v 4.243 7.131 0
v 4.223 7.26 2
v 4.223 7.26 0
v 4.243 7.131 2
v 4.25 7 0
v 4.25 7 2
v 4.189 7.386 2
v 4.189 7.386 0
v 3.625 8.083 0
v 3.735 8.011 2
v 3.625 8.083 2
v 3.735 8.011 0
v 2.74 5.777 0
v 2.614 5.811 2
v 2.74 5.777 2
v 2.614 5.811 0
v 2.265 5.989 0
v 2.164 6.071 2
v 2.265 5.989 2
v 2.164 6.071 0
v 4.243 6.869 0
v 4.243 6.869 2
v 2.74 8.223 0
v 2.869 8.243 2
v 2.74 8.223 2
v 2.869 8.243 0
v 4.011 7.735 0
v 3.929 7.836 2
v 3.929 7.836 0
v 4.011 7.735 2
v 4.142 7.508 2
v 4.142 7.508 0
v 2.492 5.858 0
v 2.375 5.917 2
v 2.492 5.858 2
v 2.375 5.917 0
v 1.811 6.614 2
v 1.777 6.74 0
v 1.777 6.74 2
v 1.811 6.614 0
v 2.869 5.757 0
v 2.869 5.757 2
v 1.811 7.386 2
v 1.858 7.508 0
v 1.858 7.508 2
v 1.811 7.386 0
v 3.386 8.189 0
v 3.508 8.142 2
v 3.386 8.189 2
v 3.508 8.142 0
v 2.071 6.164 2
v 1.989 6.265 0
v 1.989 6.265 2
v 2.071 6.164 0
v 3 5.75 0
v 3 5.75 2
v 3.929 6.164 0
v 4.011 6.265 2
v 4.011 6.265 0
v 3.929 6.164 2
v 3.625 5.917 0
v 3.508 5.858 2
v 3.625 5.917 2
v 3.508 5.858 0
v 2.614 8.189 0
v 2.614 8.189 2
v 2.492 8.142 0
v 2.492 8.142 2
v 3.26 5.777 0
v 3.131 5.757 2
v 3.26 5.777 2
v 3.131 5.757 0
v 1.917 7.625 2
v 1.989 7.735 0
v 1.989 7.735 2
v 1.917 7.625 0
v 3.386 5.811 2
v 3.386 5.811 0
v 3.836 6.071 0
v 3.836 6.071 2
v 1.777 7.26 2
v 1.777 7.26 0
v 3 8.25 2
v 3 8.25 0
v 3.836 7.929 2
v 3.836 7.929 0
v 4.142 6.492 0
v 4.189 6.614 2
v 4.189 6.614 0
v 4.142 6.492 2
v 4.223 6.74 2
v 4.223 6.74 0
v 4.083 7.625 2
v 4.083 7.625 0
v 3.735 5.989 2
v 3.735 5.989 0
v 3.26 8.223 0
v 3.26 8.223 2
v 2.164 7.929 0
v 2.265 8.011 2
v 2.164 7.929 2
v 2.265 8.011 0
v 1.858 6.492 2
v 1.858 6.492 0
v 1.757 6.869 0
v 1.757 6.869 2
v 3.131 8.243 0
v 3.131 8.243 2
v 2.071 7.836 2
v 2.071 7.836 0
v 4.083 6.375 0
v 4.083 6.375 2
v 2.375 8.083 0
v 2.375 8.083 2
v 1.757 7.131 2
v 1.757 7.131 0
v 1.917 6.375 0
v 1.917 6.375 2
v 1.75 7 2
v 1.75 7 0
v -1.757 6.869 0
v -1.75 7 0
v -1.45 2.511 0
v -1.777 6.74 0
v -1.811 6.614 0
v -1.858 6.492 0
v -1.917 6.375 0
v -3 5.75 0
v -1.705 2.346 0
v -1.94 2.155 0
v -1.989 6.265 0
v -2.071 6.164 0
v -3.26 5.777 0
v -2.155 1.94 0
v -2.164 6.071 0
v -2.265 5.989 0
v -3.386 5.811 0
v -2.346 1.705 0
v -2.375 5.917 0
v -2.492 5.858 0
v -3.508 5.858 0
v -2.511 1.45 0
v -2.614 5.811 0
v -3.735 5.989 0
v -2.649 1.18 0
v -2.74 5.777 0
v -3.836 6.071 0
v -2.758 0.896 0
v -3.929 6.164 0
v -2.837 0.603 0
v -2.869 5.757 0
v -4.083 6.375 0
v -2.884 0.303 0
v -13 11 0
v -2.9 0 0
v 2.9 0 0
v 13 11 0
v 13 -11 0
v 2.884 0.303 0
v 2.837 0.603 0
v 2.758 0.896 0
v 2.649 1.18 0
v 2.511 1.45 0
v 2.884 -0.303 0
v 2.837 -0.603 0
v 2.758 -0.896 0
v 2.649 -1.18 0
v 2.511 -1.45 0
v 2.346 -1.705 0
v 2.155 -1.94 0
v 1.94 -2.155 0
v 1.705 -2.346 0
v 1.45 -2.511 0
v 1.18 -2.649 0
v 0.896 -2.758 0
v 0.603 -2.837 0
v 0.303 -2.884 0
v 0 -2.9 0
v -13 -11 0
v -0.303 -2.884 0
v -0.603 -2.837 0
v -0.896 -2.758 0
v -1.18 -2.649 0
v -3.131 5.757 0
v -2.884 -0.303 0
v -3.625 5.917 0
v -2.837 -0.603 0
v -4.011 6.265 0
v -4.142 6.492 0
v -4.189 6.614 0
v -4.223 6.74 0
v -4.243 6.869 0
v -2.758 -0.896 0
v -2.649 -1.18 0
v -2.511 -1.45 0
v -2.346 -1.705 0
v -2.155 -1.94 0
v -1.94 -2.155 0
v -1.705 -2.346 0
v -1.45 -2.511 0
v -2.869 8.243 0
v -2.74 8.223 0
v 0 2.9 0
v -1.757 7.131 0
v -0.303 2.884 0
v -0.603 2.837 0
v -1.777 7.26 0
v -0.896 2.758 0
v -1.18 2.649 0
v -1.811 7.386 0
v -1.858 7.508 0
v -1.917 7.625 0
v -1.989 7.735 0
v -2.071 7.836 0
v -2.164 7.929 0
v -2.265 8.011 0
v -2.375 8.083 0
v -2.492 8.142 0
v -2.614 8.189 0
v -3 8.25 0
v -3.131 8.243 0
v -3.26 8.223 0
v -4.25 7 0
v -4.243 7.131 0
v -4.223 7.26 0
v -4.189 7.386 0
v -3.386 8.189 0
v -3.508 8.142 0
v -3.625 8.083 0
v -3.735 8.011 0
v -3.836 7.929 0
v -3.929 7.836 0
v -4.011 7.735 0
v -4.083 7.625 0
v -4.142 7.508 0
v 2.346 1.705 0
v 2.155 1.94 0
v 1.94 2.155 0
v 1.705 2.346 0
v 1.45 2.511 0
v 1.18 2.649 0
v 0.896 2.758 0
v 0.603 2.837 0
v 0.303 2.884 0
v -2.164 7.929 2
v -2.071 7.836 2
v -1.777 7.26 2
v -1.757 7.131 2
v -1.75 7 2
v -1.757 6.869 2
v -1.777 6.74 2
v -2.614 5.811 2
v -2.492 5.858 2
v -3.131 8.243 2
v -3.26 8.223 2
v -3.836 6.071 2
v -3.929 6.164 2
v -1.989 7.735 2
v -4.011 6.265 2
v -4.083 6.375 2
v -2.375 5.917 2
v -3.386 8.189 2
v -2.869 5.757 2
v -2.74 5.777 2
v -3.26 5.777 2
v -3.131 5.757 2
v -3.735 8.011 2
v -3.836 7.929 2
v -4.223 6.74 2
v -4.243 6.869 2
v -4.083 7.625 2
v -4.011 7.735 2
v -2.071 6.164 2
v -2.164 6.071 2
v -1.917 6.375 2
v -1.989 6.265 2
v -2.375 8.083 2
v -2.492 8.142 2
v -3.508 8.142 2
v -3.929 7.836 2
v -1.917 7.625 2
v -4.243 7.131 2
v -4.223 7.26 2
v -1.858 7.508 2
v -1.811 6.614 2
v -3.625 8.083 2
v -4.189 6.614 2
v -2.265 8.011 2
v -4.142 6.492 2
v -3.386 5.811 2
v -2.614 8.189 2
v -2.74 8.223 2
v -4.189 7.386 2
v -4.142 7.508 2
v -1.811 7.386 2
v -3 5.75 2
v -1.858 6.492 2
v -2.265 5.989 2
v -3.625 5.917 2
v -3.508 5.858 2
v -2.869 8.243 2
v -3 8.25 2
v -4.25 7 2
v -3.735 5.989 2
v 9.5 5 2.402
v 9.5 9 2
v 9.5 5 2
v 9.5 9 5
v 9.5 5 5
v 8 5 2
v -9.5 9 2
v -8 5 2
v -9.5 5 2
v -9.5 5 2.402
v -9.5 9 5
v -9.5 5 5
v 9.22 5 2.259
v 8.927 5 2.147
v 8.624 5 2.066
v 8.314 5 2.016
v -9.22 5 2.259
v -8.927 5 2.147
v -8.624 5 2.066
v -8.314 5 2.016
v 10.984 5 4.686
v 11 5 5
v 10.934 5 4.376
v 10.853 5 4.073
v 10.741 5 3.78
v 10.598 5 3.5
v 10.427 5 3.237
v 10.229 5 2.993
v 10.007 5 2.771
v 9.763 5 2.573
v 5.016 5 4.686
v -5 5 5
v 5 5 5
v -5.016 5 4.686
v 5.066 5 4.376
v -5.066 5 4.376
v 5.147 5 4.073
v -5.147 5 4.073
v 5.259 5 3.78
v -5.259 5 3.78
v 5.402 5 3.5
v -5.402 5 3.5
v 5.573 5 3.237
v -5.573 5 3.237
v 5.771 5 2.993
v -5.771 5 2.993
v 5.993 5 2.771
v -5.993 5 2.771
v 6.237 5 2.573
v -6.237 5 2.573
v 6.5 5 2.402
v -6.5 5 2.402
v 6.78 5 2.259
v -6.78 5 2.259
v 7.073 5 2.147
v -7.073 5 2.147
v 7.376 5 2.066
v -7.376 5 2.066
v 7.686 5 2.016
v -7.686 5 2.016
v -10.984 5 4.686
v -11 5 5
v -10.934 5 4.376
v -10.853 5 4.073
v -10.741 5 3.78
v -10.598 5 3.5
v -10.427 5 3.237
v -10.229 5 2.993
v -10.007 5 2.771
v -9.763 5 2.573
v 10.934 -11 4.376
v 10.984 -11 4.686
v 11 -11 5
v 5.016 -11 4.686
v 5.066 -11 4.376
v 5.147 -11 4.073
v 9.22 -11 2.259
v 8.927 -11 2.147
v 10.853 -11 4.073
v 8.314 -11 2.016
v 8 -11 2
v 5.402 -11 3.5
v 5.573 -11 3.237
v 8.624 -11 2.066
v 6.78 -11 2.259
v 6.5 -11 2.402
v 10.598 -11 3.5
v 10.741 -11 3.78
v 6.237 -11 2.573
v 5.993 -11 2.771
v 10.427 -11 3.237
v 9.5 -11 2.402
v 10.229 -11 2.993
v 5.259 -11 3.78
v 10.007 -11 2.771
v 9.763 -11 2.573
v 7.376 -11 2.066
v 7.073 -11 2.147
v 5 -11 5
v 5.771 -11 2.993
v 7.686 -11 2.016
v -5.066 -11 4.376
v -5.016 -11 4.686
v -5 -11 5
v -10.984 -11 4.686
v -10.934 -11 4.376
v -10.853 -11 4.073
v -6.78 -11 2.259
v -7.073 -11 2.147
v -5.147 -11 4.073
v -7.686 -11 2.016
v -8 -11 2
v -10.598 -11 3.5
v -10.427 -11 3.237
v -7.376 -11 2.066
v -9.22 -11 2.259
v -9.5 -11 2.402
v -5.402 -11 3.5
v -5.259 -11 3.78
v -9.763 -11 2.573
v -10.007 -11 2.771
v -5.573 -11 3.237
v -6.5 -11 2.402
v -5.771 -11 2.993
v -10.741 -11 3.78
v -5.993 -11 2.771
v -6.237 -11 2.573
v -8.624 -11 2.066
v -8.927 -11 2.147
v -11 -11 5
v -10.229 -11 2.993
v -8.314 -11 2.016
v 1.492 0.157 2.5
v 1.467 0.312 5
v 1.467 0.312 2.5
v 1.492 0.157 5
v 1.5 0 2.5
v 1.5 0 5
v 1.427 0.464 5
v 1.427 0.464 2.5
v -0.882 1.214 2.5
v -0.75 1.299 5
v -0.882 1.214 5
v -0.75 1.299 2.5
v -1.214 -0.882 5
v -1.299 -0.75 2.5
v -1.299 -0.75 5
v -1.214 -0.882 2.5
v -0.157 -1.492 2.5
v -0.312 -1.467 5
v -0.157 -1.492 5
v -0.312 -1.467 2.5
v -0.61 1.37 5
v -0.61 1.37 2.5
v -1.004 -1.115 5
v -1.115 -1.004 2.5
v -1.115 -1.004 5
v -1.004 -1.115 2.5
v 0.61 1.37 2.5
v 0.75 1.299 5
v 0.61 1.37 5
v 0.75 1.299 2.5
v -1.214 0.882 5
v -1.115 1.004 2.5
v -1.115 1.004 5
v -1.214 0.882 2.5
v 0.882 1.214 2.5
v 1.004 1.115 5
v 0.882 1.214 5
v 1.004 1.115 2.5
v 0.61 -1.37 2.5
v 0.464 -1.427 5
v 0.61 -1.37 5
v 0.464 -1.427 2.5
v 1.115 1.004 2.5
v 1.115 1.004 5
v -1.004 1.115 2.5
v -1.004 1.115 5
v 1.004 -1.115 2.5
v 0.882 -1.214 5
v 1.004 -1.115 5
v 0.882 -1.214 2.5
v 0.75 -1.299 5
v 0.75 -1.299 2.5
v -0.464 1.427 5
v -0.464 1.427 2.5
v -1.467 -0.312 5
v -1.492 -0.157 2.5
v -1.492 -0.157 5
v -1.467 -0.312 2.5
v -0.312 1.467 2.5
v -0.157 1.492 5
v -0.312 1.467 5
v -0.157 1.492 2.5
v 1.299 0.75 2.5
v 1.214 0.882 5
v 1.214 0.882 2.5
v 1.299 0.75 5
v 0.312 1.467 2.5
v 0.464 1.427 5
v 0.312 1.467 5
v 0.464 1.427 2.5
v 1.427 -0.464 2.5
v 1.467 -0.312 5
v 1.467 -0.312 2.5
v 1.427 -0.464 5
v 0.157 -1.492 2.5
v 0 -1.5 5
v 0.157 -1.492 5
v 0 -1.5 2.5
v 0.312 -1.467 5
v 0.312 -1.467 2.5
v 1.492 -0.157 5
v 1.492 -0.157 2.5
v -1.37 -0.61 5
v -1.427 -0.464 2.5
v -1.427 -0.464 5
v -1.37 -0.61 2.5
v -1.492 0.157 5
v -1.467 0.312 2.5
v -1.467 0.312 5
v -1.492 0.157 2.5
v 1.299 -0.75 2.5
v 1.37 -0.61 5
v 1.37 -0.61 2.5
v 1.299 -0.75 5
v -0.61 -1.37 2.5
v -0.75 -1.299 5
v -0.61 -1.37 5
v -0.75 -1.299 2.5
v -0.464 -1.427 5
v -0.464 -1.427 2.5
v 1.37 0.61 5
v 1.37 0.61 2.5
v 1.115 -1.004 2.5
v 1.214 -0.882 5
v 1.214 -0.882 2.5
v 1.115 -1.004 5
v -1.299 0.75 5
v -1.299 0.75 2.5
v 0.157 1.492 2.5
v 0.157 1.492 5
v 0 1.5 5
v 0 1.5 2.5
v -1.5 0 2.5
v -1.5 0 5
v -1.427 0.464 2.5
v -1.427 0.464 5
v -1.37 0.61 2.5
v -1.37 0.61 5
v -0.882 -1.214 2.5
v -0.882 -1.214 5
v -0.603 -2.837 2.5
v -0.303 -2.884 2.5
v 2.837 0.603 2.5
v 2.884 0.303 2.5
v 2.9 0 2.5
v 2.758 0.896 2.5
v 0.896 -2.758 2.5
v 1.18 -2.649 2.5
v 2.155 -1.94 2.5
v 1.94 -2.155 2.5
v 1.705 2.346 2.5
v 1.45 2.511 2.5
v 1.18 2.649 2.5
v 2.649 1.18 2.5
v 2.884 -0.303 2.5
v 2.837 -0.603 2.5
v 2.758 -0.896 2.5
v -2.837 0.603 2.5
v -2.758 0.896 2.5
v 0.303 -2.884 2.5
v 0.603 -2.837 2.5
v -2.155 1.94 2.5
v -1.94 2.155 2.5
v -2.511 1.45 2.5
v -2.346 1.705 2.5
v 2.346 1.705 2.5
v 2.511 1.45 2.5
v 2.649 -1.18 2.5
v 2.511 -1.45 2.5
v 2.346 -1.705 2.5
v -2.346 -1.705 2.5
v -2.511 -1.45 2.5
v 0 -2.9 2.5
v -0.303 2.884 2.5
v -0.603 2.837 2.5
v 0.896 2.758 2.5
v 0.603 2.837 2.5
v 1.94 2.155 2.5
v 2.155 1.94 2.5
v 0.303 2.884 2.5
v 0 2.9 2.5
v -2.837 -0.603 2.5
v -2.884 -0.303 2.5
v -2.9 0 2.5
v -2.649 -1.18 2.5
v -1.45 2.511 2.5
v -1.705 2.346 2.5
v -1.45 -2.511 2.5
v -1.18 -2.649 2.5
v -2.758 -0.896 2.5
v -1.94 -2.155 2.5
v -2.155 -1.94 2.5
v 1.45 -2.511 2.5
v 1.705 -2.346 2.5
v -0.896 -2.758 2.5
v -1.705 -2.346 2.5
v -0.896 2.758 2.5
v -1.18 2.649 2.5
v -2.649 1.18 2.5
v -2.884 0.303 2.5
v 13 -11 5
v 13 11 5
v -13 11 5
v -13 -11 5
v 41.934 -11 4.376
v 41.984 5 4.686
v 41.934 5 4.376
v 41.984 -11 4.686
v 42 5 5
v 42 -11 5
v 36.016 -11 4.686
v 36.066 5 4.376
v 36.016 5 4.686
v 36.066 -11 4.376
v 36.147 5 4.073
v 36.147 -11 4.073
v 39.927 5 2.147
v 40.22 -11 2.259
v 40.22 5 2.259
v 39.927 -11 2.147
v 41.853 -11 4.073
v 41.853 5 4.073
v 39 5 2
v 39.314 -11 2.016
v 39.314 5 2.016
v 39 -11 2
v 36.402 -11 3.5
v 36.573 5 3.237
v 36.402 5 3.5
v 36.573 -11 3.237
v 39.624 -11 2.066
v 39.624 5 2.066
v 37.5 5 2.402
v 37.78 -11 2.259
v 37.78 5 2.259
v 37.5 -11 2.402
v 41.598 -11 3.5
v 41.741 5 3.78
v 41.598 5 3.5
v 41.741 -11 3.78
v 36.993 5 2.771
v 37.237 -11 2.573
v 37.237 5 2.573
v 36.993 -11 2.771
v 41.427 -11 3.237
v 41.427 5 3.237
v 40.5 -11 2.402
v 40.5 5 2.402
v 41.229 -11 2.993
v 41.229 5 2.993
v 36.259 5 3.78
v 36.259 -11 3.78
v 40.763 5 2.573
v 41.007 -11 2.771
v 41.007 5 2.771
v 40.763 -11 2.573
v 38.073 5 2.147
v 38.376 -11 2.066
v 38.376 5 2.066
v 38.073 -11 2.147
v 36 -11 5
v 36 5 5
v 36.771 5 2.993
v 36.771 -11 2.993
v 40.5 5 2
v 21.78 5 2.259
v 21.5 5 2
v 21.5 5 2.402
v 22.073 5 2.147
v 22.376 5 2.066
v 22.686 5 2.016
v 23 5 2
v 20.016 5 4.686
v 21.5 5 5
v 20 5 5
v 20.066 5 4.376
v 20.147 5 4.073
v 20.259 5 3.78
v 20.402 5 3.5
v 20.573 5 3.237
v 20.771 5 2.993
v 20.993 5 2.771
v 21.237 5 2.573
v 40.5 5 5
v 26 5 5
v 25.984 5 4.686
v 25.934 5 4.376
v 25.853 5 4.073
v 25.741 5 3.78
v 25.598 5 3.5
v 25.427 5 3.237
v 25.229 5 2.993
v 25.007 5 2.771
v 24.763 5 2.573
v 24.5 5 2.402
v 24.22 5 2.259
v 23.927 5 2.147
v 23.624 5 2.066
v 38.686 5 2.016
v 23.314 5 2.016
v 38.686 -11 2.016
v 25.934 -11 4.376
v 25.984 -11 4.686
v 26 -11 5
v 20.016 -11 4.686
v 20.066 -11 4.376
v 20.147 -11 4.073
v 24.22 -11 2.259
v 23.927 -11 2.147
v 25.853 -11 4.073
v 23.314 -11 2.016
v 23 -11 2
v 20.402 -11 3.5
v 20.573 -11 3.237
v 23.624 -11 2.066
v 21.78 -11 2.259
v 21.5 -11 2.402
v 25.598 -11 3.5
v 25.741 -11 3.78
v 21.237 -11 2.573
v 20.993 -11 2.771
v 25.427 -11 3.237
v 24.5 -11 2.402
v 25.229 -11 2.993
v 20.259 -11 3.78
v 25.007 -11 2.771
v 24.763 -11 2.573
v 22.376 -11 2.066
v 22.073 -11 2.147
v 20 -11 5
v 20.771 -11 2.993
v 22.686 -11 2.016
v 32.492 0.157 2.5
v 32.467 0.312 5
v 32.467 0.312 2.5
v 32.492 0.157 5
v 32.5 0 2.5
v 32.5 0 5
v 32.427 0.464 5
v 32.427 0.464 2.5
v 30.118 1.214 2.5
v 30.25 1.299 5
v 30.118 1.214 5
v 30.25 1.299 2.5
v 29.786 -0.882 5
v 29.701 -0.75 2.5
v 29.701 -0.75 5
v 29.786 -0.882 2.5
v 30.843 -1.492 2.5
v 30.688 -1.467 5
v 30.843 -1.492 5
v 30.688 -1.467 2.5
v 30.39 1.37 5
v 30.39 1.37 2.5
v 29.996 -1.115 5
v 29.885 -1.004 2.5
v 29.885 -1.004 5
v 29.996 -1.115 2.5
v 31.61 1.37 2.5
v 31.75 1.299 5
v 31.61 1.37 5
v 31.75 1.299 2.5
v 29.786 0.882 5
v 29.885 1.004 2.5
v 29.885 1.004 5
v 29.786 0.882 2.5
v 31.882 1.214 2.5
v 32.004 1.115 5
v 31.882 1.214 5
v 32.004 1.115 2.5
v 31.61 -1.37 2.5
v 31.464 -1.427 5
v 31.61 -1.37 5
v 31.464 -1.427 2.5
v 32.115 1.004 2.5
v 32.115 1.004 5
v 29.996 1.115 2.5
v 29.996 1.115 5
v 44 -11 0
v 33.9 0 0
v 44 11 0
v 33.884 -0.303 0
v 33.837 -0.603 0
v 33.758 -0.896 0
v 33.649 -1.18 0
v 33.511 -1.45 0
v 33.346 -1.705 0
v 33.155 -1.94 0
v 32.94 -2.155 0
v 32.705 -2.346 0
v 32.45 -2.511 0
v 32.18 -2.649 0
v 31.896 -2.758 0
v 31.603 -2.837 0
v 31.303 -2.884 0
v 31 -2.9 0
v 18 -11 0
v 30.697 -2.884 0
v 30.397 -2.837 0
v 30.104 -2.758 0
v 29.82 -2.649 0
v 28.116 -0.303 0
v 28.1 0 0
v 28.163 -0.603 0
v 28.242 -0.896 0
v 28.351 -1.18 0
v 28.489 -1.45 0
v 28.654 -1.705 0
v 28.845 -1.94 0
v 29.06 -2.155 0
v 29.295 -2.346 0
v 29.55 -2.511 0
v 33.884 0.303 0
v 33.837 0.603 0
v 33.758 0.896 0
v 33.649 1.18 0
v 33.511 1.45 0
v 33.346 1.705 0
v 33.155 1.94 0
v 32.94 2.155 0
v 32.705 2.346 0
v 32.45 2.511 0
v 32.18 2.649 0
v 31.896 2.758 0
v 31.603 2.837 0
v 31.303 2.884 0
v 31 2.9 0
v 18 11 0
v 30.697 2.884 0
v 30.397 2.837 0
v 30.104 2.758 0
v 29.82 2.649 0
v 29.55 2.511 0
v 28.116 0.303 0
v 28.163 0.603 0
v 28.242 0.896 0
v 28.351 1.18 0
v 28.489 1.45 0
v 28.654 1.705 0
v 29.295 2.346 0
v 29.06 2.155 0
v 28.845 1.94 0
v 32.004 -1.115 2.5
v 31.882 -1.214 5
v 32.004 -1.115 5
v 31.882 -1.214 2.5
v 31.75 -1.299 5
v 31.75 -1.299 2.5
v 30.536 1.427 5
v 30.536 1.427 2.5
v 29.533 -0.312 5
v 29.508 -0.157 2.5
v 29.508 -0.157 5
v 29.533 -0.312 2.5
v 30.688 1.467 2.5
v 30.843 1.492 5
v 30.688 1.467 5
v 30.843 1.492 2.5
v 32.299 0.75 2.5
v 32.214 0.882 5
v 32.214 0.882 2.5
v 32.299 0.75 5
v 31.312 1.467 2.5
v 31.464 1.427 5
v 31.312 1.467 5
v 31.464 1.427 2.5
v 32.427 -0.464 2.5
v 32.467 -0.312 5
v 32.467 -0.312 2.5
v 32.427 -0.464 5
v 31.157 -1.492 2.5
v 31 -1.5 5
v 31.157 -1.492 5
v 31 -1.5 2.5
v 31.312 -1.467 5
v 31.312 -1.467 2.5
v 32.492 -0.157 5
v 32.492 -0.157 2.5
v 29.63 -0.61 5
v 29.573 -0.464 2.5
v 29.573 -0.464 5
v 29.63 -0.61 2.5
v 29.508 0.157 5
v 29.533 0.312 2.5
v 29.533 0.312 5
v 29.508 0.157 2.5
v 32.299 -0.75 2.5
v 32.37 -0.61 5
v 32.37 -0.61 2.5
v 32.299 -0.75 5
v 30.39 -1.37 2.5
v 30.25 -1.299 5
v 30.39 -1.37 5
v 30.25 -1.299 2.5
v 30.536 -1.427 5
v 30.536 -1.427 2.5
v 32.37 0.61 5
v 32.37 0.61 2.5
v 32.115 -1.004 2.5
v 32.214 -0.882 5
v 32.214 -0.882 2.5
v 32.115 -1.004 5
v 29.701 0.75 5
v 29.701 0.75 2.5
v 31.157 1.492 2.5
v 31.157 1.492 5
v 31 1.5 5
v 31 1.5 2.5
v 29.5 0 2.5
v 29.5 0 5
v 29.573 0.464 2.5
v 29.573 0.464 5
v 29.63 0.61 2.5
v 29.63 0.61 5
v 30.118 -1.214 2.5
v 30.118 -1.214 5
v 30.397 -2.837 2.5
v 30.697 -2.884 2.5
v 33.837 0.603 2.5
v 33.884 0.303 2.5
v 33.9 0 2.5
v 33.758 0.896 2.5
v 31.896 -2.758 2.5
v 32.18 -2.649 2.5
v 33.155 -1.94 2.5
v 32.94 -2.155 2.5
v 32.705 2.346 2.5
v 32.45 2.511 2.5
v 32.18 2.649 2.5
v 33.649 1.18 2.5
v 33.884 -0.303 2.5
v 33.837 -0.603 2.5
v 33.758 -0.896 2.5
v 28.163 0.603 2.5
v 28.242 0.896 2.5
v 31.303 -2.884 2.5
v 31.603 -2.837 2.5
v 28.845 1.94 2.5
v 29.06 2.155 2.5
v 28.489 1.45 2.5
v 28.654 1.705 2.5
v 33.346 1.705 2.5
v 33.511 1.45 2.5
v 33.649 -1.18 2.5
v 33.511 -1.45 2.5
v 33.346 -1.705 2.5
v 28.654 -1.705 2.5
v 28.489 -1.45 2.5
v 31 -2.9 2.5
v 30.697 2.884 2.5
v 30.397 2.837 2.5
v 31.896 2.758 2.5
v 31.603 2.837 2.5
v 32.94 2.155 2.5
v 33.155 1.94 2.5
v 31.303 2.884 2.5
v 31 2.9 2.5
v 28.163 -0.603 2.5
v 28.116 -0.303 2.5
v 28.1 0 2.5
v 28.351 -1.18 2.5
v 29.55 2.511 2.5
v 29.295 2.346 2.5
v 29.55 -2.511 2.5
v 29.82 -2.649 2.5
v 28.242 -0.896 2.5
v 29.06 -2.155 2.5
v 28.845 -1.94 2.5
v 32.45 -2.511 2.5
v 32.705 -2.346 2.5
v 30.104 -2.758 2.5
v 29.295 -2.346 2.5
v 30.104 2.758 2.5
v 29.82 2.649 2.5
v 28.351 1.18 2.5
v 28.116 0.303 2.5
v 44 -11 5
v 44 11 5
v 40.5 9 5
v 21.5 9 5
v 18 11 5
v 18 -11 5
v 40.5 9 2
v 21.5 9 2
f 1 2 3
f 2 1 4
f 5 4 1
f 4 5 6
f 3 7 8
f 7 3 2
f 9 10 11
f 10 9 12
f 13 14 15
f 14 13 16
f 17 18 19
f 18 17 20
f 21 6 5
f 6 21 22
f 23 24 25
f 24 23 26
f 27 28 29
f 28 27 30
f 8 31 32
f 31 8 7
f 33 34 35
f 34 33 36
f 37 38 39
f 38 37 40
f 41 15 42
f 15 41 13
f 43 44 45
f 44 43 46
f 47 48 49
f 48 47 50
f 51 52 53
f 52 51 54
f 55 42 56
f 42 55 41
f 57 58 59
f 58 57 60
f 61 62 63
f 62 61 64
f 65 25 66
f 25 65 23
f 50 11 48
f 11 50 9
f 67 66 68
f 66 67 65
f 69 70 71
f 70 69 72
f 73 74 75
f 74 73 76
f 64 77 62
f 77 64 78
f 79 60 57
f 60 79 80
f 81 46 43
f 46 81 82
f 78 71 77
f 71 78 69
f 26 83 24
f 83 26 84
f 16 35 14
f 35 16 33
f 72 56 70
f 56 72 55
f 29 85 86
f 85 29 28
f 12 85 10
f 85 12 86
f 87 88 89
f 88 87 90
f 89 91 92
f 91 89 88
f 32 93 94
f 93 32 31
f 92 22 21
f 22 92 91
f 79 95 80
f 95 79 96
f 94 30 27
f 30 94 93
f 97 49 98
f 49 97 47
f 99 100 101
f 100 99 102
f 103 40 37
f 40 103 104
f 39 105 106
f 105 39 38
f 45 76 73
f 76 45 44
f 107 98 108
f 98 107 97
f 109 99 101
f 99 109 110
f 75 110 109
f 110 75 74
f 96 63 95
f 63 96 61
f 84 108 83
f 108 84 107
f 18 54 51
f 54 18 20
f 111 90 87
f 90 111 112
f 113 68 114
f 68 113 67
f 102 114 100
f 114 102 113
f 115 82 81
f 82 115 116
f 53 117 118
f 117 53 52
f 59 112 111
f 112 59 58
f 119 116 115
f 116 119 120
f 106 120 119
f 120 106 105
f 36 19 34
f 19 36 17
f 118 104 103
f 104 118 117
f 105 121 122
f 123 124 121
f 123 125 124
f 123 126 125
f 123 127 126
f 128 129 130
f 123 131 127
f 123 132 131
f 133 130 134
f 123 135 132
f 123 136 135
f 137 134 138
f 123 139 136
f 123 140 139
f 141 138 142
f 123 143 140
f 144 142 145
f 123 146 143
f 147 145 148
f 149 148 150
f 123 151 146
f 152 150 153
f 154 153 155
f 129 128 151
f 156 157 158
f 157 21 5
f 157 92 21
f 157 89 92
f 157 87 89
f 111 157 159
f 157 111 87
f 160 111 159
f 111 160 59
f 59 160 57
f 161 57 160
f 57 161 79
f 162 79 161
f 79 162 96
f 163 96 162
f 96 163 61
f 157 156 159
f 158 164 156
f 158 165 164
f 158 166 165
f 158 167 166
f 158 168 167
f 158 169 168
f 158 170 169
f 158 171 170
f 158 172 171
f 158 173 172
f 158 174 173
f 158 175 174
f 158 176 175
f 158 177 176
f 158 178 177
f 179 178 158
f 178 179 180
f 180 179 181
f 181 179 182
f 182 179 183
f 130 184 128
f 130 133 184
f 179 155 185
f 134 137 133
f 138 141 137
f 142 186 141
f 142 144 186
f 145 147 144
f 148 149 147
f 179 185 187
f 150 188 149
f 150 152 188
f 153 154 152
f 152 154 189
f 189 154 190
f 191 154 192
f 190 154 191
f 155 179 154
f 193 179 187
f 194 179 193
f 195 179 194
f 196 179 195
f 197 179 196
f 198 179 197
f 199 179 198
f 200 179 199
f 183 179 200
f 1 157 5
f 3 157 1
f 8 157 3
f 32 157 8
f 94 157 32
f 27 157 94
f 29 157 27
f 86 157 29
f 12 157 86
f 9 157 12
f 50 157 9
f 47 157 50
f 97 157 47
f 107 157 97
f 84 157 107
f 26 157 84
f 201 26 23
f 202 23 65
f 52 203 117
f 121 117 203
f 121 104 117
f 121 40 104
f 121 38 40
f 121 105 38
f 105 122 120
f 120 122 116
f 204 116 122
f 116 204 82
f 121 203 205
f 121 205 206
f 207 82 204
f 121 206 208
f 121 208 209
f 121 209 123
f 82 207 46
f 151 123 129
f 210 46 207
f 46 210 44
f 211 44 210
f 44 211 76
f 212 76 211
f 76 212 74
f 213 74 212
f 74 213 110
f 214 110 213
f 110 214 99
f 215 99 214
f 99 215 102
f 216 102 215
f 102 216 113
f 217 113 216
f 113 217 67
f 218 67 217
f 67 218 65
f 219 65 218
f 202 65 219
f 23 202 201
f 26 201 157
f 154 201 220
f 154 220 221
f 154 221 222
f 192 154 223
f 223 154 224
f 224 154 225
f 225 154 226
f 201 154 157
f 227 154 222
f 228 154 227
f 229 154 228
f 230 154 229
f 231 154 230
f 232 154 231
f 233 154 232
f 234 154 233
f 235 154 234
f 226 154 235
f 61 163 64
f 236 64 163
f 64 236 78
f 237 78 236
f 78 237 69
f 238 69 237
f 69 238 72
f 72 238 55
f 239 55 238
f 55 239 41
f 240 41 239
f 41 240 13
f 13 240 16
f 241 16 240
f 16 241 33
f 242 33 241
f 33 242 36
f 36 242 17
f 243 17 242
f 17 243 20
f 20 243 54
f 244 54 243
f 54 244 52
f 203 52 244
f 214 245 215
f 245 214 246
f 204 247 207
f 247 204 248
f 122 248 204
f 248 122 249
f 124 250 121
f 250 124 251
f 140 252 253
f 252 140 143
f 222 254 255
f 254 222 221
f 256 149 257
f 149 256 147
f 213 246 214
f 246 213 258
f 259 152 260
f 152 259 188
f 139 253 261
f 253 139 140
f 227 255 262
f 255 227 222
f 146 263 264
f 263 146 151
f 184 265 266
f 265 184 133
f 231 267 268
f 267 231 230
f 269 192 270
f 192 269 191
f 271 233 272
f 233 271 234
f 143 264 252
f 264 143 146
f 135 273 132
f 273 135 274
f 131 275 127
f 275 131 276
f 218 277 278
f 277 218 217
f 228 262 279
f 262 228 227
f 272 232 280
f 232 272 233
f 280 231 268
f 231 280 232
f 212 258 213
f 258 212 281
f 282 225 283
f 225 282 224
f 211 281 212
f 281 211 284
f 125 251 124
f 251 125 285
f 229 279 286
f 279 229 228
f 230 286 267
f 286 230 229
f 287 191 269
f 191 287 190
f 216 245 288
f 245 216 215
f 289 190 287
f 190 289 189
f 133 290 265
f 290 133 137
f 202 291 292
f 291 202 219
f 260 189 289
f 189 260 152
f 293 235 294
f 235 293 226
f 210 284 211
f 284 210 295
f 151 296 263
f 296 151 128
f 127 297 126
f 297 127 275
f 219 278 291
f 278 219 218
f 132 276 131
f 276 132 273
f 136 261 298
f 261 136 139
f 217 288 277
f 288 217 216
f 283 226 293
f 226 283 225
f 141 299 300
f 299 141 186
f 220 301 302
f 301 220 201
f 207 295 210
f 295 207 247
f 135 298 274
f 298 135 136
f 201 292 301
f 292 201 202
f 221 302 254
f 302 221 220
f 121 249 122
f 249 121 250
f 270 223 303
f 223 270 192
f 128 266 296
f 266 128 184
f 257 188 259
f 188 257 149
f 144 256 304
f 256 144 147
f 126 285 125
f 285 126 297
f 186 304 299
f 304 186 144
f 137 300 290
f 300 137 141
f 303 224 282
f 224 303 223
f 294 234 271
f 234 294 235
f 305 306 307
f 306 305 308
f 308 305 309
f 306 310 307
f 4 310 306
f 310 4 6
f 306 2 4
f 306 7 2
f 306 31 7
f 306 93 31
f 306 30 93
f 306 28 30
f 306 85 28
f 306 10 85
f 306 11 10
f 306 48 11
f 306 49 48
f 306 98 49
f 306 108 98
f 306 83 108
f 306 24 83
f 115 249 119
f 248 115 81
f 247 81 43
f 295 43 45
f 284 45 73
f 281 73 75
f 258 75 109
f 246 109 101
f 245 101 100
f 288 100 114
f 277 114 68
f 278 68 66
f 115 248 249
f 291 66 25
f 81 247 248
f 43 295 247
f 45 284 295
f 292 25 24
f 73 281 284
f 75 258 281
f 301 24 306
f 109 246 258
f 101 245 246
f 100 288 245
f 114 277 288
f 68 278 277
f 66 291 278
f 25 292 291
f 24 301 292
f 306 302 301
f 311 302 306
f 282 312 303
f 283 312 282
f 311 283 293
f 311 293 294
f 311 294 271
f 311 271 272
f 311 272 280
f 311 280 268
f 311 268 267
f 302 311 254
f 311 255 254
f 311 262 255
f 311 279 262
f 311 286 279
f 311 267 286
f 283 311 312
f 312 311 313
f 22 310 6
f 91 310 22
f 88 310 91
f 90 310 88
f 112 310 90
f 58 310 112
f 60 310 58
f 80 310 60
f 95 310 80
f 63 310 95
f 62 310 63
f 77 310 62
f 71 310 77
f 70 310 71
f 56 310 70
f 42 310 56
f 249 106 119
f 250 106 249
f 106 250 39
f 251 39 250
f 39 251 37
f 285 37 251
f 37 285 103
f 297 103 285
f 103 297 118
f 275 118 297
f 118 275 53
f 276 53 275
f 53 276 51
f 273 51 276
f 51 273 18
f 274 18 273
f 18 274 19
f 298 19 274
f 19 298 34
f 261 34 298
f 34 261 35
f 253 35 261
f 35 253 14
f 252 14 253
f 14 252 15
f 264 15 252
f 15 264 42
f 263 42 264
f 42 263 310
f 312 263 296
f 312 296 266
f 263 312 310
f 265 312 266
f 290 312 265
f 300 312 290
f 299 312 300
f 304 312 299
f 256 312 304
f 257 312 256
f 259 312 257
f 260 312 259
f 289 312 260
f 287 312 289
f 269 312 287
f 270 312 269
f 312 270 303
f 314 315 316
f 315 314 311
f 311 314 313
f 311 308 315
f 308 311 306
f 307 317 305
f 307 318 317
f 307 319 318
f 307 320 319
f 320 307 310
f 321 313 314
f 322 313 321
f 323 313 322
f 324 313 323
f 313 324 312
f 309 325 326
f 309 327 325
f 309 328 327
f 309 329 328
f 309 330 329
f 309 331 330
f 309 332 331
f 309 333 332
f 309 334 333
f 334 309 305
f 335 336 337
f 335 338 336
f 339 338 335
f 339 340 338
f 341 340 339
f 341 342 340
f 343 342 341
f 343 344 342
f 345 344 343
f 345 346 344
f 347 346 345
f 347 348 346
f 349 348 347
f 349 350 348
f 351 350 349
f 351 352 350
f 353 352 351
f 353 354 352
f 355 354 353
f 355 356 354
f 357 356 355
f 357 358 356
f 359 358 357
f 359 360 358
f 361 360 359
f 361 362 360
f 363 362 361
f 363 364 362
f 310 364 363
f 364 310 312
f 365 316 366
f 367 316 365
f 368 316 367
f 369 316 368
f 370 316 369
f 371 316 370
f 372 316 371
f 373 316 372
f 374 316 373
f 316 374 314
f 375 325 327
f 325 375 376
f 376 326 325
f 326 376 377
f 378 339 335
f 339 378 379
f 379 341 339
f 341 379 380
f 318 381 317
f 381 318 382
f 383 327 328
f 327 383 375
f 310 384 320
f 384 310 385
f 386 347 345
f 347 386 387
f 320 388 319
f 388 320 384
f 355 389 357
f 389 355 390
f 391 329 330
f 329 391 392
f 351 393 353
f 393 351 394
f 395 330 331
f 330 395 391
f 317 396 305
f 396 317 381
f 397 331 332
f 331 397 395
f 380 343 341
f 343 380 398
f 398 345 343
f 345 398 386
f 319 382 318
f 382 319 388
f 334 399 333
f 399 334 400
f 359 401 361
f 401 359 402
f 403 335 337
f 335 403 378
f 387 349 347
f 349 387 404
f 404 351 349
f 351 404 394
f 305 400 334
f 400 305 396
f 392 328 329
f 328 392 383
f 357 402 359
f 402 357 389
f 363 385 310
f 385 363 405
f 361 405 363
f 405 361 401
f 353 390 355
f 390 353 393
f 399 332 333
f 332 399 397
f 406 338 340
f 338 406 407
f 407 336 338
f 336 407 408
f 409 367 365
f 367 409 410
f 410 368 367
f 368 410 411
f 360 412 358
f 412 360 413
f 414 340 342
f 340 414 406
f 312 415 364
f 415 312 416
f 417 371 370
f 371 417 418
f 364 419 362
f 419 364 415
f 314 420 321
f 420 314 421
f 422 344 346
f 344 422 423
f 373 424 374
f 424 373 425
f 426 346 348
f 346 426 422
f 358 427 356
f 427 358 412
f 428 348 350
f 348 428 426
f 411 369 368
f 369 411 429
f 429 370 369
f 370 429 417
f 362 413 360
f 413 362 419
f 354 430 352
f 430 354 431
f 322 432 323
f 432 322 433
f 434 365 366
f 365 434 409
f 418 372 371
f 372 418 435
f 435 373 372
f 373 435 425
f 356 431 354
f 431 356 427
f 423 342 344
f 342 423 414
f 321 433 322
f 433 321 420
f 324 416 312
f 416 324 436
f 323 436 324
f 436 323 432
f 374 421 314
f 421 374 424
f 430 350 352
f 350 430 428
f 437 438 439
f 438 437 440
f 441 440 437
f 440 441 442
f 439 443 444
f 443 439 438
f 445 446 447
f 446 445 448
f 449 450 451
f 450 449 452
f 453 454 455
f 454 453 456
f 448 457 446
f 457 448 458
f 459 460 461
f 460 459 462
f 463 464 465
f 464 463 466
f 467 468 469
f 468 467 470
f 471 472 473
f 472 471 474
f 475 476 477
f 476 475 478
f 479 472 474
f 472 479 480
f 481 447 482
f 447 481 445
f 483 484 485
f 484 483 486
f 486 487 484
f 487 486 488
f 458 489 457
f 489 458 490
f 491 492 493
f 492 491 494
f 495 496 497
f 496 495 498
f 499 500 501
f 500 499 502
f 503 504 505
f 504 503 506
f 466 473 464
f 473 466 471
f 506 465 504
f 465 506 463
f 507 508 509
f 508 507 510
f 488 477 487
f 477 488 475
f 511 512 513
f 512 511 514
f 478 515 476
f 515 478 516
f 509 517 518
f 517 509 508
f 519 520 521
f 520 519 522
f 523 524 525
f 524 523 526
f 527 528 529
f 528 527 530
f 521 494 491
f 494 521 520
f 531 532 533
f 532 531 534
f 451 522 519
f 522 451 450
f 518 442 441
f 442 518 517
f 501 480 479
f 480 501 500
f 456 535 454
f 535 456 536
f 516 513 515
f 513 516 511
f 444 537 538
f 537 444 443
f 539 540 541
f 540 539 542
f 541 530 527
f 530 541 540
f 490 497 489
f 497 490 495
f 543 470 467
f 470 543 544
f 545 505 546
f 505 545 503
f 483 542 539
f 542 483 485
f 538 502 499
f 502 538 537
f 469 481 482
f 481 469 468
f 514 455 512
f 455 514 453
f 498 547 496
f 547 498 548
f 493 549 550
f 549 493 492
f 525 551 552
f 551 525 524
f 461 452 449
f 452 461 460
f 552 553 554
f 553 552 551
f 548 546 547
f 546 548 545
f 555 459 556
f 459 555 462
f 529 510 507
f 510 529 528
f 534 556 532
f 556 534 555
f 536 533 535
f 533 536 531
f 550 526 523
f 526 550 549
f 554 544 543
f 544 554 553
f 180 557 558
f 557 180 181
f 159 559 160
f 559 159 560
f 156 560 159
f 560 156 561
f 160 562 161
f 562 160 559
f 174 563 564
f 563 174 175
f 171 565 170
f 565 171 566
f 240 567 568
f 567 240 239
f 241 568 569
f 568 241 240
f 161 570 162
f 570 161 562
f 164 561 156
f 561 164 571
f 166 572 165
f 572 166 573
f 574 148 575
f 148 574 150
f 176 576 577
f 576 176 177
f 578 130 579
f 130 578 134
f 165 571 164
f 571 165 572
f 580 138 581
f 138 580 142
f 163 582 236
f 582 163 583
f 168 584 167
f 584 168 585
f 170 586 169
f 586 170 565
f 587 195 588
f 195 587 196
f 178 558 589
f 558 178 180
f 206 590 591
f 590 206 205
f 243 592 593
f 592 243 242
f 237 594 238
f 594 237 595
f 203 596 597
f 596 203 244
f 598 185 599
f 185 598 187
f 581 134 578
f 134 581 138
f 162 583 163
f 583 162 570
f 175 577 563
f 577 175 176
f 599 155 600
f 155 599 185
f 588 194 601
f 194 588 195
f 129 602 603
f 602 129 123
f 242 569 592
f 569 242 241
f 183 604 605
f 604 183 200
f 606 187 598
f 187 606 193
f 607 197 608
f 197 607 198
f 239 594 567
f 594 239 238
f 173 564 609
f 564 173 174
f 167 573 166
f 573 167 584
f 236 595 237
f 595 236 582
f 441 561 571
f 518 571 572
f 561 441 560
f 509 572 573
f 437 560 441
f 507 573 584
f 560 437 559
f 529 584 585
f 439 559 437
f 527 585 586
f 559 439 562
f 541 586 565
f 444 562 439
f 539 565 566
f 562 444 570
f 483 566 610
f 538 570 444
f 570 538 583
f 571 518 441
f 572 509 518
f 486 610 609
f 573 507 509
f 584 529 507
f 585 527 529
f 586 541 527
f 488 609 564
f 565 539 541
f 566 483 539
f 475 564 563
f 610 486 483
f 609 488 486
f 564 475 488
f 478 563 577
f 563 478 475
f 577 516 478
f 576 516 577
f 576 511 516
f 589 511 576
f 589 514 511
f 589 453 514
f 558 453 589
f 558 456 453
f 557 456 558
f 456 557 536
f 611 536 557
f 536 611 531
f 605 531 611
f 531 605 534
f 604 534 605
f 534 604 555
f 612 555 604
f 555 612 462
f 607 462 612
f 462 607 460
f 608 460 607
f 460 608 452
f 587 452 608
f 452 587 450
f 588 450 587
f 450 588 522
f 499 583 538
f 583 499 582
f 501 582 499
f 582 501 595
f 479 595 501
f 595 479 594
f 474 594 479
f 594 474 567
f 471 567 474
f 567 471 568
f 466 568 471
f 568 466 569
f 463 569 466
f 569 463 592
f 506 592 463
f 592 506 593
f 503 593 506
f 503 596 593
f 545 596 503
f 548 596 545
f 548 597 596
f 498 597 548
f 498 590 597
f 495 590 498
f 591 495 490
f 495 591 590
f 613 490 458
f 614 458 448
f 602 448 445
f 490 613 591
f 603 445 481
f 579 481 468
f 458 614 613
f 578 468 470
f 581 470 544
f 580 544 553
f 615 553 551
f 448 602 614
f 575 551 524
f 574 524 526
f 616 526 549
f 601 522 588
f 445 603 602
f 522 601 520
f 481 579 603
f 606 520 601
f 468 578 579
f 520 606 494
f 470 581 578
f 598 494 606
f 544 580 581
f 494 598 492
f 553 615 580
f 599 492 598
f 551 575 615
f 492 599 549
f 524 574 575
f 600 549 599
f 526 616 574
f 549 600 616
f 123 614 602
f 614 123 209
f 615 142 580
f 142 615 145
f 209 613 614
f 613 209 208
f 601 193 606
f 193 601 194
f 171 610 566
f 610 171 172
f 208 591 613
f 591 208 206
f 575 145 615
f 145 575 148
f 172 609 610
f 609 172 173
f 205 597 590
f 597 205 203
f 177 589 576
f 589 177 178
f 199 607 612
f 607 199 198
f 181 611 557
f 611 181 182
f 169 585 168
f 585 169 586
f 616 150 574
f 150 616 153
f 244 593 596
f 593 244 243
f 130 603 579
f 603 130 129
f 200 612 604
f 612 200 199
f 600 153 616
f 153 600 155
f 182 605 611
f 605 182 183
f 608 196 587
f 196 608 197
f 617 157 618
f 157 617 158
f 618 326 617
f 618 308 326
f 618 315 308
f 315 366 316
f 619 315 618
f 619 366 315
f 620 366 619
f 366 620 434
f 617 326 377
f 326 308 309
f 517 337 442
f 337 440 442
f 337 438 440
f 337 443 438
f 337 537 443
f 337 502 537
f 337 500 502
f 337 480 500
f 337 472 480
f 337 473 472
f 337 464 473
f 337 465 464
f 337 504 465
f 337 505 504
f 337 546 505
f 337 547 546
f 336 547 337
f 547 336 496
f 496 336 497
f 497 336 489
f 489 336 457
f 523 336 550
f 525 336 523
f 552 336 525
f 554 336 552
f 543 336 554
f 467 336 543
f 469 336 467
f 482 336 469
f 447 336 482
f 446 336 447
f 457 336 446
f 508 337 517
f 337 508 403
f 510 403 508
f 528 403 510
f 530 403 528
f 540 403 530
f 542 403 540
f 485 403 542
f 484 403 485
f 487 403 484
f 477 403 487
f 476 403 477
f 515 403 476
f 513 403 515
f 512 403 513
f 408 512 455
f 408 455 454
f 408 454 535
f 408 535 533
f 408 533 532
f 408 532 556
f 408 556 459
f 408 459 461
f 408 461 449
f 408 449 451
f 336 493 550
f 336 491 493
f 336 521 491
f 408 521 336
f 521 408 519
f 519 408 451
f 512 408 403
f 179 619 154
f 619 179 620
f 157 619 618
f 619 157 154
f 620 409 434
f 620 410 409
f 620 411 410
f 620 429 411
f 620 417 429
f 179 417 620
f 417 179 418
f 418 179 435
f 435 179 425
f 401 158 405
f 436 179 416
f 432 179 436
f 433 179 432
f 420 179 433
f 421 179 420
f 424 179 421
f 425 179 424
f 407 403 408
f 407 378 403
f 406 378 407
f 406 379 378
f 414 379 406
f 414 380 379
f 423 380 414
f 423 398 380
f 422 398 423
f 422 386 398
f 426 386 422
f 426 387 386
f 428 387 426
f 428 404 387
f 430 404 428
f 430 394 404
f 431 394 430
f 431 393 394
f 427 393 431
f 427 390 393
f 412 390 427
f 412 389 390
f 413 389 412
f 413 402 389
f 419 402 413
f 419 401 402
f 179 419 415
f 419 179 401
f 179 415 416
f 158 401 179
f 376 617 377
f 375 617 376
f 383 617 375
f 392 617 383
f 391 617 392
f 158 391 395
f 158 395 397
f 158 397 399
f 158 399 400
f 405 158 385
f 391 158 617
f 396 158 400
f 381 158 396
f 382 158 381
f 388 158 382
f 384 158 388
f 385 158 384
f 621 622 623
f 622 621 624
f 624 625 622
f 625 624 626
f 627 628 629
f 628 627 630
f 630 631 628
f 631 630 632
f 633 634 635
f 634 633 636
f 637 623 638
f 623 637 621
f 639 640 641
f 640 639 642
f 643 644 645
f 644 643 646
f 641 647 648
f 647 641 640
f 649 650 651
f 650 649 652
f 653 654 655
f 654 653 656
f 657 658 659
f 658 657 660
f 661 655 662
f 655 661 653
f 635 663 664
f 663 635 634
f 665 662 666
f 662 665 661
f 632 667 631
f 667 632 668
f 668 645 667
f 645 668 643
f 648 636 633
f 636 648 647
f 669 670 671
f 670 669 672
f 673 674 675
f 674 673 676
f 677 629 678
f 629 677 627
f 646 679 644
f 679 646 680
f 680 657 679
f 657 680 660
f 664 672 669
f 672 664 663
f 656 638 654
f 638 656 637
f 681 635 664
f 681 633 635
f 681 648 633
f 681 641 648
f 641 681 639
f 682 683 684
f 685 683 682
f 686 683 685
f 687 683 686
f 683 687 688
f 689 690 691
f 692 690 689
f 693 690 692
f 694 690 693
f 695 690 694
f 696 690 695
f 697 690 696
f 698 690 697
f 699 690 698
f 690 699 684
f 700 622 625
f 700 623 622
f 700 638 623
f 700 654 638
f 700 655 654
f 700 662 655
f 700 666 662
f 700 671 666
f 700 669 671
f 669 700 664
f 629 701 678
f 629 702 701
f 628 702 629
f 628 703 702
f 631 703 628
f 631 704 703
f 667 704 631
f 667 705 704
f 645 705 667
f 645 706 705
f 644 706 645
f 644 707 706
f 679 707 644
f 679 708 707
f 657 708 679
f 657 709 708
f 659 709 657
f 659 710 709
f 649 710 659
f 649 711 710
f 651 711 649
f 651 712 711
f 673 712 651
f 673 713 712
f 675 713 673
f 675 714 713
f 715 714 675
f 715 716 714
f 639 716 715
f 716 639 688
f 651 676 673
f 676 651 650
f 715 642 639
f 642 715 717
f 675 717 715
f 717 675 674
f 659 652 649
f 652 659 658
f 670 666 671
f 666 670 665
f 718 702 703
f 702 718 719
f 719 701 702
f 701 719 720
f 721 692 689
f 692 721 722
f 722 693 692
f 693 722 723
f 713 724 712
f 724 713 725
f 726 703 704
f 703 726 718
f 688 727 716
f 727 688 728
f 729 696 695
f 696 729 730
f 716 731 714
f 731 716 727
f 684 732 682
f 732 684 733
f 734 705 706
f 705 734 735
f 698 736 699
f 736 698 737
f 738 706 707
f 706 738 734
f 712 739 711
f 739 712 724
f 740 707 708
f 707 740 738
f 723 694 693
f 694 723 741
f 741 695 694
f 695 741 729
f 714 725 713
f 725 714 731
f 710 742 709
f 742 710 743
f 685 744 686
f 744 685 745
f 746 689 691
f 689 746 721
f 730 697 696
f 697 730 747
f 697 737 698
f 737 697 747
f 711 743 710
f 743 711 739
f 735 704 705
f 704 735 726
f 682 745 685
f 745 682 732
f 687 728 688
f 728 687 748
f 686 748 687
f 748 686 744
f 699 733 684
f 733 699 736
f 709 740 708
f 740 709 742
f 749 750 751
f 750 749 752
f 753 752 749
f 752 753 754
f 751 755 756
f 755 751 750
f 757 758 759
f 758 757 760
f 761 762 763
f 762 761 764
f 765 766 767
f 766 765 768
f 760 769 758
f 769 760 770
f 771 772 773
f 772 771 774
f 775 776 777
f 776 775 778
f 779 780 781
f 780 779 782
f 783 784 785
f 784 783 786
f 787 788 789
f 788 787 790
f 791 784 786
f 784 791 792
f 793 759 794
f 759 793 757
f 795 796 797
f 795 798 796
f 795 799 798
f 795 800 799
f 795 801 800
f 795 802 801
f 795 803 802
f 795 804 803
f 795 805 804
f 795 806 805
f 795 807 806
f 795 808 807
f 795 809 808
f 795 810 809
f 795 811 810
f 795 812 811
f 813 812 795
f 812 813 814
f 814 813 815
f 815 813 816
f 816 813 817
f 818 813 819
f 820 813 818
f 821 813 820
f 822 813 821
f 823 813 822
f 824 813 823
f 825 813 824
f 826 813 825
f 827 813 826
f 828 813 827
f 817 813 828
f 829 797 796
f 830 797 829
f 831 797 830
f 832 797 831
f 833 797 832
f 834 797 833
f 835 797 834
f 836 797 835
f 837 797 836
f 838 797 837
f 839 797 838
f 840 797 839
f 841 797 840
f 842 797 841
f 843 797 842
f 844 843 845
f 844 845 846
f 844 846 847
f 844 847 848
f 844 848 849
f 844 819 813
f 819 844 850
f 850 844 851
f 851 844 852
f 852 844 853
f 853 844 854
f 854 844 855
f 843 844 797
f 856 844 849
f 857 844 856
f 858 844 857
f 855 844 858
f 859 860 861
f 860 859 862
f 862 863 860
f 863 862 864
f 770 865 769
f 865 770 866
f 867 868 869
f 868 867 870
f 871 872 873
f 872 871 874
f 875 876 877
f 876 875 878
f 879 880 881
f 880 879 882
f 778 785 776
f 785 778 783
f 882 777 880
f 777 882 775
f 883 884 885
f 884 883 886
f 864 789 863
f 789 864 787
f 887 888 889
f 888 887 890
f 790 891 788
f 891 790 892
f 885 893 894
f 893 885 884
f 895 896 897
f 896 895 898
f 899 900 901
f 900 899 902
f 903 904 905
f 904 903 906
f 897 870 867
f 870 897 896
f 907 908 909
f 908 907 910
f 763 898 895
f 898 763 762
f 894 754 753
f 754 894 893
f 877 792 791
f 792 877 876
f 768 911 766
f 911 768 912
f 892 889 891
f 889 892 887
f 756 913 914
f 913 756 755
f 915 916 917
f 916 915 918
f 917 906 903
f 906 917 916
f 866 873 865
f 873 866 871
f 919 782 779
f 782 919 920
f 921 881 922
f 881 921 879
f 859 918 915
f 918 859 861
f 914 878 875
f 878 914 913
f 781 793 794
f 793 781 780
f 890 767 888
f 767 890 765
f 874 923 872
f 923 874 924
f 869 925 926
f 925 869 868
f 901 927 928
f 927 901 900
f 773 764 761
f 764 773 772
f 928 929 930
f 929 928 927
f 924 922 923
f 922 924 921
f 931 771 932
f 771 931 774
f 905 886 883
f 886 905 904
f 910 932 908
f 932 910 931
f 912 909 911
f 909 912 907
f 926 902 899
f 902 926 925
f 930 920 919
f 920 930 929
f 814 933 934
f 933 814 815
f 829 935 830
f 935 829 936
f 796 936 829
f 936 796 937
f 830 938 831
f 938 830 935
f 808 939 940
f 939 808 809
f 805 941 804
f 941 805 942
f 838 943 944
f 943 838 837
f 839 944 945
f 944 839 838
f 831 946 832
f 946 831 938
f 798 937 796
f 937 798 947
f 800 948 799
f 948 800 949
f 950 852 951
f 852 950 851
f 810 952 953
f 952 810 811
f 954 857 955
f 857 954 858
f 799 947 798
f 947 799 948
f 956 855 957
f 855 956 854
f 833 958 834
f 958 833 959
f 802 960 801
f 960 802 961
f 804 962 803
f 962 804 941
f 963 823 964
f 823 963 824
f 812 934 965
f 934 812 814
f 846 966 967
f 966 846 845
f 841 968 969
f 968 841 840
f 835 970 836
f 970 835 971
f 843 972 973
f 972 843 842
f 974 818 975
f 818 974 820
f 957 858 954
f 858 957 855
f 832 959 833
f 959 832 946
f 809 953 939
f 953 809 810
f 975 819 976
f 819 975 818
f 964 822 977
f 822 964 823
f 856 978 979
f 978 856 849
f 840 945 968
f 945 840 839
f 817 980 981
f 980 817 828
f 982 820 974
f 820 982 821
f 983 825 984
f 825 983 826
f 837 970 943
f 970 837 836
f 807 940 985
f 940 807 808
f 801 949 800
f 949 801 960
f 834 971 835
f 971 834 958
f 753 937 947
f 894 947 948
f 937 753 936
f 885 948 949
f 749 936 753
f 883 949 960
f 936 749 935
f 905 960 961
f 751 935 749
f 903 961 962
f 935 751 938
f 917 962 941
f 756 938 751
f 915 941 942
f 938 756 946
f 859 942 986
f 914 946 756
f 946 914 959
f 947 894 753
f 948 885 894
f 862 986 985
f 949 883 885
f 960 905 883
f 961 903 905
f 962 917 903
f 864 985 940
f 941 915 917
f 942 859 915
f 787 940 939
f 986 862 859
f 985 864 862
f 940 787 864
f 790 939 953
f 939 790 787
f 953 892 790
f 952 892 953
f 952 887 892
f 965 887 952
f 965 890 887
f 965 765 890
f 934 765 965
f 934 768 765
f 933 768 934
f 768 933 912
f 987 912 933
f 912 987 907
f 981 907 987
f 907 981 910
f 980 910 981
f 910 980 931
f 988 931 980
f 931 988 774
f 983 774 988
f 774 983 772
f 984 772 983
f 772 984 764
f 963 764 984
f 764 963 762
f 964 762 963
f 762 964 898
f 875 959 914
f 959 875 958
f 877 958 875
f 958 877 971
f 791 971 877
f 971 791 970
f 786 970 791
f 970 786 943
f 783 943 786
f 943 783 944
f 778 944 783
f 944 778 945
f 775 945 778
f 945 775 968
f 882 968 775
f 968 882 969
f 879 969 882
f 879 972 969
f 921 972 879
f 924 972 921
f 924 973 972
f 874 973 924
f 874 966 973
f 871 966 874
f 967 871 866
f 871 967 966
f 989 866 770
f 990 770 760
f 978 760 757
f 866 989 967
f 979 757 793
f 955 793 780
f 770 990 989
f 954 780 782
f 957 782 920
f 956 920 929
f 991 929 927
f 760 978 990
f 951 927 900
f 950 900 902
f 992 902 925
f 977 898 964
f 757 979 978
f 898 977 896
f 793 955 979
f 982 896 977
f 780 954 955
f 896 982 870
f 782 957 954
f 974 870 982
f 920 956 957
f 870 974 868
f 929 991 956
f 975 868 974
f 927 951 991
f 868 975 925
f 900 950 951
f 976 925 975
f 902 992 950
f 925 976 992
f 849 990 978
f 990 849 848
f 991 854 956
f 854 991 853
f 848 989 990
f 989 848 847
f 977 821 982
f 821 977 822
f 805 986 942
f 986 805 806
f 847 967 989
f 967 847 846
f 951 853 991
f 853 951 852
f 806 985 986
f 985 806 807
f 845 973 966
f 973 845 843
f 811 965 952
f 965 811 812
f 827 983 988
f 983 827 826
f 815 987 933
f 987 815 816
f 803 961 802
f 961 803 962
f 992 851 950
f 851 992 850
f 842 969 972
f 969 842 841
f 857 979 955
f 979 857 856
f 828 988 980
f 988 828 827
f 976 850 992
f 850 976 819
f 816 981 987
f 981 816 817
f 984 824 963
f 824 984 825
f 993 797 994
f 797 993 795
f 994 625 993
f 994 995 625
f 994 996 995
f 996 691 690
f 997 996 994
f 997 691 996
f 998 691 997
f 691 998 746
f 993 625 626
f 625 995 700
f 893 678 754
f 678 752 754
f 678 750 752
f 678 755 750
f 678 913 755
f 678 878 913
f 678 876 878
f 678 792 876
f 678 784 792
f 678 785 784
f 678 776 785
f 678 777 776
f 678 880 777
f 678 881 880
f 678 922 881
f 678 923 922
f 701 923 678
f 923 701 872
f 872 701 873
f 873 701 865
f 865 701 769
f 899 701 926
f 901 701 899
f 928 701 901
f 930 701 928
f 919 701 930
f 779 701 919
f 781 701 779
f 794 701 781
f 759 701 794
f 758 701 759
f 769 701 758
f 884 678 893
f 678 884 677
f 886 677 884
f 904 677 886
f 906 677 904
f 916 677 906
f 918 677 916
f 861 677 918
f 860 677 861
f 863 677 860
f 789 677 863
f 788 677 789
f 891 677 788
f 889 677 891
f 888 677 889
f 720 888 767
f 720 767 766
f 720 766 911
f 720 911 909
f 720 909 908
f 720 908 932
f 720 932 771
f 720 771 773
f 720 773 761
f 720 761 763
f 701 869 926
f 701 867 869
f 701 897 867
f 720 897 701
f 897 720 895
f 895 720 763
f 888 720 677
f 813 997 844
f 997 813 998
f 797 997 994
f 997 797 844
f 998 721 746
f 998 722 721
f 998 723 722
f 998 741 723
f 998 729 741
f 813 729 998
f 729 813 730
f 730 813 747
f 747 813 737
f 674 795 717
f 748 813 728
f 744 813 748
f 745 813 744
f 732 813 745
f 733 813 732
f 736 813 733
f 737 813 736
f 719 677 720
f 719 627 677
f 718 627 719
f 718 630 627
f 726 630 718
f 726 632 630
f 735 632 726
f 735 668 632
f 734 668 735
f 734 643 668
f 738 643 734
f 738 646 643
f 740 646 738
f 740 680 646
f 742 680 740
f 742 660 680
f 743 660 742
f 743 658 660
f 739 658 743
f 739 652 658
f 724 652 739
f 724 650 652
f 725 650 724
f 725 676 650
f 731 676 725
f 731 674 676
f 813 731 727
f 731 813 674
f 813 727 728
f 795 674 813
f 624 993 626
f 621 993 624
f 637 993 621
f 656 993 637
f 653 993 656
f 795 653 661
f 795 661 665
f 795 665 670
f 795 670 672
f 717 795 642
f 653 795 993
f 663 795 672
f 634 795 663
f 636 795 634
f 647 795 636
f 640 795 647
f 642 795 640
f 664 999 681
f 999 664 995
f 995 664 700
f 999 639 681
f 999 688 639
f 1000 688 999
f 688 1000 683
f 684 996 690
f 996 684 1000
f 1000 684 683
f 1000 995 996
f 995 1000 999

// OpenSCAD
$fn=60;

// Diameter of probe
probeDiam=6;        
// Spacing between probe
probeSpacing=16;
// THickness of wall
wall=2.0;

// Length of probe (Visual only)
probeLength=120;

// Diameter of screw
screwDiam=3;
// Height of screw head
screwHead=2.5;
// Diameter of screw head
screwHeadDiam=5.8;

///Offset probe from center of casing
probeEndOffset=5;

// Do not change below
wall2=wall*2;
probeSpacingD2=probeSpacing/2;
dim=[probeSpacing + probeDiam + wall2,probeEndOffset*2+4*2+wall2,probeDiam+wall2];

echo("Casing dimention ");
echo(dim);


soilProbe(true);
translate([dim.x+5,0,0]) soilProbe(false);

module soilProbe(bottom=true) {
    translate([0,0,dim.z/2])
    union() {
        difference() {
            union() {
                cube(dim, center=true);
                
            }
            union() {
                // Cut in half
                translate([0,0,dim.z/2]) cube(dim, center=true);

                // Room for Wire
                translate([0,probeEndOffset+2,0]) {
                    cube([probeSpacing+probeDiam/2,4,probeDiam], center=true);
                    if (bottom) {
                        translate([3,0,0]) cylinder(d=2.5,h=dim.z,center=true);
                        translate([-3,0,0]) cylinder(d=2.5,h=dim.z,center=true);
                    }
                }
                
                // Probe
                translate([probeSpacingD2,probeEndOffset,0]) probe();
                translate([-probeSpacingD2,probeEndOffset,0]) probe();      
                
                // screw Portion
                screw();
            }
        }

        %translate([probeSpacingD2,probeEndOffset,0]) probe();
        %translate([-probeSpacingD2,probeEndOffset,0]) probe();
    }
}


module screw() {
    cylinder(d=screwDiam,h=dim.z,center=true);
    translate([0,0,-dim.z/2+screwHead/2]) cylinder(d=screwHeadDiam,h=screwHead,center=true);
}    


module probe() {
    pointL=probeDiam*2.5;
    color([0.5,1,0.5]) rotate([90,0,0]) {
        cylinder(d=probeDiam,h=probeLength-pointL);
        translate([0,0,probeLength-pointL]) cylinder(d2=0, d1=probeDiam, h=probeDiam*2.5);
    }

}
